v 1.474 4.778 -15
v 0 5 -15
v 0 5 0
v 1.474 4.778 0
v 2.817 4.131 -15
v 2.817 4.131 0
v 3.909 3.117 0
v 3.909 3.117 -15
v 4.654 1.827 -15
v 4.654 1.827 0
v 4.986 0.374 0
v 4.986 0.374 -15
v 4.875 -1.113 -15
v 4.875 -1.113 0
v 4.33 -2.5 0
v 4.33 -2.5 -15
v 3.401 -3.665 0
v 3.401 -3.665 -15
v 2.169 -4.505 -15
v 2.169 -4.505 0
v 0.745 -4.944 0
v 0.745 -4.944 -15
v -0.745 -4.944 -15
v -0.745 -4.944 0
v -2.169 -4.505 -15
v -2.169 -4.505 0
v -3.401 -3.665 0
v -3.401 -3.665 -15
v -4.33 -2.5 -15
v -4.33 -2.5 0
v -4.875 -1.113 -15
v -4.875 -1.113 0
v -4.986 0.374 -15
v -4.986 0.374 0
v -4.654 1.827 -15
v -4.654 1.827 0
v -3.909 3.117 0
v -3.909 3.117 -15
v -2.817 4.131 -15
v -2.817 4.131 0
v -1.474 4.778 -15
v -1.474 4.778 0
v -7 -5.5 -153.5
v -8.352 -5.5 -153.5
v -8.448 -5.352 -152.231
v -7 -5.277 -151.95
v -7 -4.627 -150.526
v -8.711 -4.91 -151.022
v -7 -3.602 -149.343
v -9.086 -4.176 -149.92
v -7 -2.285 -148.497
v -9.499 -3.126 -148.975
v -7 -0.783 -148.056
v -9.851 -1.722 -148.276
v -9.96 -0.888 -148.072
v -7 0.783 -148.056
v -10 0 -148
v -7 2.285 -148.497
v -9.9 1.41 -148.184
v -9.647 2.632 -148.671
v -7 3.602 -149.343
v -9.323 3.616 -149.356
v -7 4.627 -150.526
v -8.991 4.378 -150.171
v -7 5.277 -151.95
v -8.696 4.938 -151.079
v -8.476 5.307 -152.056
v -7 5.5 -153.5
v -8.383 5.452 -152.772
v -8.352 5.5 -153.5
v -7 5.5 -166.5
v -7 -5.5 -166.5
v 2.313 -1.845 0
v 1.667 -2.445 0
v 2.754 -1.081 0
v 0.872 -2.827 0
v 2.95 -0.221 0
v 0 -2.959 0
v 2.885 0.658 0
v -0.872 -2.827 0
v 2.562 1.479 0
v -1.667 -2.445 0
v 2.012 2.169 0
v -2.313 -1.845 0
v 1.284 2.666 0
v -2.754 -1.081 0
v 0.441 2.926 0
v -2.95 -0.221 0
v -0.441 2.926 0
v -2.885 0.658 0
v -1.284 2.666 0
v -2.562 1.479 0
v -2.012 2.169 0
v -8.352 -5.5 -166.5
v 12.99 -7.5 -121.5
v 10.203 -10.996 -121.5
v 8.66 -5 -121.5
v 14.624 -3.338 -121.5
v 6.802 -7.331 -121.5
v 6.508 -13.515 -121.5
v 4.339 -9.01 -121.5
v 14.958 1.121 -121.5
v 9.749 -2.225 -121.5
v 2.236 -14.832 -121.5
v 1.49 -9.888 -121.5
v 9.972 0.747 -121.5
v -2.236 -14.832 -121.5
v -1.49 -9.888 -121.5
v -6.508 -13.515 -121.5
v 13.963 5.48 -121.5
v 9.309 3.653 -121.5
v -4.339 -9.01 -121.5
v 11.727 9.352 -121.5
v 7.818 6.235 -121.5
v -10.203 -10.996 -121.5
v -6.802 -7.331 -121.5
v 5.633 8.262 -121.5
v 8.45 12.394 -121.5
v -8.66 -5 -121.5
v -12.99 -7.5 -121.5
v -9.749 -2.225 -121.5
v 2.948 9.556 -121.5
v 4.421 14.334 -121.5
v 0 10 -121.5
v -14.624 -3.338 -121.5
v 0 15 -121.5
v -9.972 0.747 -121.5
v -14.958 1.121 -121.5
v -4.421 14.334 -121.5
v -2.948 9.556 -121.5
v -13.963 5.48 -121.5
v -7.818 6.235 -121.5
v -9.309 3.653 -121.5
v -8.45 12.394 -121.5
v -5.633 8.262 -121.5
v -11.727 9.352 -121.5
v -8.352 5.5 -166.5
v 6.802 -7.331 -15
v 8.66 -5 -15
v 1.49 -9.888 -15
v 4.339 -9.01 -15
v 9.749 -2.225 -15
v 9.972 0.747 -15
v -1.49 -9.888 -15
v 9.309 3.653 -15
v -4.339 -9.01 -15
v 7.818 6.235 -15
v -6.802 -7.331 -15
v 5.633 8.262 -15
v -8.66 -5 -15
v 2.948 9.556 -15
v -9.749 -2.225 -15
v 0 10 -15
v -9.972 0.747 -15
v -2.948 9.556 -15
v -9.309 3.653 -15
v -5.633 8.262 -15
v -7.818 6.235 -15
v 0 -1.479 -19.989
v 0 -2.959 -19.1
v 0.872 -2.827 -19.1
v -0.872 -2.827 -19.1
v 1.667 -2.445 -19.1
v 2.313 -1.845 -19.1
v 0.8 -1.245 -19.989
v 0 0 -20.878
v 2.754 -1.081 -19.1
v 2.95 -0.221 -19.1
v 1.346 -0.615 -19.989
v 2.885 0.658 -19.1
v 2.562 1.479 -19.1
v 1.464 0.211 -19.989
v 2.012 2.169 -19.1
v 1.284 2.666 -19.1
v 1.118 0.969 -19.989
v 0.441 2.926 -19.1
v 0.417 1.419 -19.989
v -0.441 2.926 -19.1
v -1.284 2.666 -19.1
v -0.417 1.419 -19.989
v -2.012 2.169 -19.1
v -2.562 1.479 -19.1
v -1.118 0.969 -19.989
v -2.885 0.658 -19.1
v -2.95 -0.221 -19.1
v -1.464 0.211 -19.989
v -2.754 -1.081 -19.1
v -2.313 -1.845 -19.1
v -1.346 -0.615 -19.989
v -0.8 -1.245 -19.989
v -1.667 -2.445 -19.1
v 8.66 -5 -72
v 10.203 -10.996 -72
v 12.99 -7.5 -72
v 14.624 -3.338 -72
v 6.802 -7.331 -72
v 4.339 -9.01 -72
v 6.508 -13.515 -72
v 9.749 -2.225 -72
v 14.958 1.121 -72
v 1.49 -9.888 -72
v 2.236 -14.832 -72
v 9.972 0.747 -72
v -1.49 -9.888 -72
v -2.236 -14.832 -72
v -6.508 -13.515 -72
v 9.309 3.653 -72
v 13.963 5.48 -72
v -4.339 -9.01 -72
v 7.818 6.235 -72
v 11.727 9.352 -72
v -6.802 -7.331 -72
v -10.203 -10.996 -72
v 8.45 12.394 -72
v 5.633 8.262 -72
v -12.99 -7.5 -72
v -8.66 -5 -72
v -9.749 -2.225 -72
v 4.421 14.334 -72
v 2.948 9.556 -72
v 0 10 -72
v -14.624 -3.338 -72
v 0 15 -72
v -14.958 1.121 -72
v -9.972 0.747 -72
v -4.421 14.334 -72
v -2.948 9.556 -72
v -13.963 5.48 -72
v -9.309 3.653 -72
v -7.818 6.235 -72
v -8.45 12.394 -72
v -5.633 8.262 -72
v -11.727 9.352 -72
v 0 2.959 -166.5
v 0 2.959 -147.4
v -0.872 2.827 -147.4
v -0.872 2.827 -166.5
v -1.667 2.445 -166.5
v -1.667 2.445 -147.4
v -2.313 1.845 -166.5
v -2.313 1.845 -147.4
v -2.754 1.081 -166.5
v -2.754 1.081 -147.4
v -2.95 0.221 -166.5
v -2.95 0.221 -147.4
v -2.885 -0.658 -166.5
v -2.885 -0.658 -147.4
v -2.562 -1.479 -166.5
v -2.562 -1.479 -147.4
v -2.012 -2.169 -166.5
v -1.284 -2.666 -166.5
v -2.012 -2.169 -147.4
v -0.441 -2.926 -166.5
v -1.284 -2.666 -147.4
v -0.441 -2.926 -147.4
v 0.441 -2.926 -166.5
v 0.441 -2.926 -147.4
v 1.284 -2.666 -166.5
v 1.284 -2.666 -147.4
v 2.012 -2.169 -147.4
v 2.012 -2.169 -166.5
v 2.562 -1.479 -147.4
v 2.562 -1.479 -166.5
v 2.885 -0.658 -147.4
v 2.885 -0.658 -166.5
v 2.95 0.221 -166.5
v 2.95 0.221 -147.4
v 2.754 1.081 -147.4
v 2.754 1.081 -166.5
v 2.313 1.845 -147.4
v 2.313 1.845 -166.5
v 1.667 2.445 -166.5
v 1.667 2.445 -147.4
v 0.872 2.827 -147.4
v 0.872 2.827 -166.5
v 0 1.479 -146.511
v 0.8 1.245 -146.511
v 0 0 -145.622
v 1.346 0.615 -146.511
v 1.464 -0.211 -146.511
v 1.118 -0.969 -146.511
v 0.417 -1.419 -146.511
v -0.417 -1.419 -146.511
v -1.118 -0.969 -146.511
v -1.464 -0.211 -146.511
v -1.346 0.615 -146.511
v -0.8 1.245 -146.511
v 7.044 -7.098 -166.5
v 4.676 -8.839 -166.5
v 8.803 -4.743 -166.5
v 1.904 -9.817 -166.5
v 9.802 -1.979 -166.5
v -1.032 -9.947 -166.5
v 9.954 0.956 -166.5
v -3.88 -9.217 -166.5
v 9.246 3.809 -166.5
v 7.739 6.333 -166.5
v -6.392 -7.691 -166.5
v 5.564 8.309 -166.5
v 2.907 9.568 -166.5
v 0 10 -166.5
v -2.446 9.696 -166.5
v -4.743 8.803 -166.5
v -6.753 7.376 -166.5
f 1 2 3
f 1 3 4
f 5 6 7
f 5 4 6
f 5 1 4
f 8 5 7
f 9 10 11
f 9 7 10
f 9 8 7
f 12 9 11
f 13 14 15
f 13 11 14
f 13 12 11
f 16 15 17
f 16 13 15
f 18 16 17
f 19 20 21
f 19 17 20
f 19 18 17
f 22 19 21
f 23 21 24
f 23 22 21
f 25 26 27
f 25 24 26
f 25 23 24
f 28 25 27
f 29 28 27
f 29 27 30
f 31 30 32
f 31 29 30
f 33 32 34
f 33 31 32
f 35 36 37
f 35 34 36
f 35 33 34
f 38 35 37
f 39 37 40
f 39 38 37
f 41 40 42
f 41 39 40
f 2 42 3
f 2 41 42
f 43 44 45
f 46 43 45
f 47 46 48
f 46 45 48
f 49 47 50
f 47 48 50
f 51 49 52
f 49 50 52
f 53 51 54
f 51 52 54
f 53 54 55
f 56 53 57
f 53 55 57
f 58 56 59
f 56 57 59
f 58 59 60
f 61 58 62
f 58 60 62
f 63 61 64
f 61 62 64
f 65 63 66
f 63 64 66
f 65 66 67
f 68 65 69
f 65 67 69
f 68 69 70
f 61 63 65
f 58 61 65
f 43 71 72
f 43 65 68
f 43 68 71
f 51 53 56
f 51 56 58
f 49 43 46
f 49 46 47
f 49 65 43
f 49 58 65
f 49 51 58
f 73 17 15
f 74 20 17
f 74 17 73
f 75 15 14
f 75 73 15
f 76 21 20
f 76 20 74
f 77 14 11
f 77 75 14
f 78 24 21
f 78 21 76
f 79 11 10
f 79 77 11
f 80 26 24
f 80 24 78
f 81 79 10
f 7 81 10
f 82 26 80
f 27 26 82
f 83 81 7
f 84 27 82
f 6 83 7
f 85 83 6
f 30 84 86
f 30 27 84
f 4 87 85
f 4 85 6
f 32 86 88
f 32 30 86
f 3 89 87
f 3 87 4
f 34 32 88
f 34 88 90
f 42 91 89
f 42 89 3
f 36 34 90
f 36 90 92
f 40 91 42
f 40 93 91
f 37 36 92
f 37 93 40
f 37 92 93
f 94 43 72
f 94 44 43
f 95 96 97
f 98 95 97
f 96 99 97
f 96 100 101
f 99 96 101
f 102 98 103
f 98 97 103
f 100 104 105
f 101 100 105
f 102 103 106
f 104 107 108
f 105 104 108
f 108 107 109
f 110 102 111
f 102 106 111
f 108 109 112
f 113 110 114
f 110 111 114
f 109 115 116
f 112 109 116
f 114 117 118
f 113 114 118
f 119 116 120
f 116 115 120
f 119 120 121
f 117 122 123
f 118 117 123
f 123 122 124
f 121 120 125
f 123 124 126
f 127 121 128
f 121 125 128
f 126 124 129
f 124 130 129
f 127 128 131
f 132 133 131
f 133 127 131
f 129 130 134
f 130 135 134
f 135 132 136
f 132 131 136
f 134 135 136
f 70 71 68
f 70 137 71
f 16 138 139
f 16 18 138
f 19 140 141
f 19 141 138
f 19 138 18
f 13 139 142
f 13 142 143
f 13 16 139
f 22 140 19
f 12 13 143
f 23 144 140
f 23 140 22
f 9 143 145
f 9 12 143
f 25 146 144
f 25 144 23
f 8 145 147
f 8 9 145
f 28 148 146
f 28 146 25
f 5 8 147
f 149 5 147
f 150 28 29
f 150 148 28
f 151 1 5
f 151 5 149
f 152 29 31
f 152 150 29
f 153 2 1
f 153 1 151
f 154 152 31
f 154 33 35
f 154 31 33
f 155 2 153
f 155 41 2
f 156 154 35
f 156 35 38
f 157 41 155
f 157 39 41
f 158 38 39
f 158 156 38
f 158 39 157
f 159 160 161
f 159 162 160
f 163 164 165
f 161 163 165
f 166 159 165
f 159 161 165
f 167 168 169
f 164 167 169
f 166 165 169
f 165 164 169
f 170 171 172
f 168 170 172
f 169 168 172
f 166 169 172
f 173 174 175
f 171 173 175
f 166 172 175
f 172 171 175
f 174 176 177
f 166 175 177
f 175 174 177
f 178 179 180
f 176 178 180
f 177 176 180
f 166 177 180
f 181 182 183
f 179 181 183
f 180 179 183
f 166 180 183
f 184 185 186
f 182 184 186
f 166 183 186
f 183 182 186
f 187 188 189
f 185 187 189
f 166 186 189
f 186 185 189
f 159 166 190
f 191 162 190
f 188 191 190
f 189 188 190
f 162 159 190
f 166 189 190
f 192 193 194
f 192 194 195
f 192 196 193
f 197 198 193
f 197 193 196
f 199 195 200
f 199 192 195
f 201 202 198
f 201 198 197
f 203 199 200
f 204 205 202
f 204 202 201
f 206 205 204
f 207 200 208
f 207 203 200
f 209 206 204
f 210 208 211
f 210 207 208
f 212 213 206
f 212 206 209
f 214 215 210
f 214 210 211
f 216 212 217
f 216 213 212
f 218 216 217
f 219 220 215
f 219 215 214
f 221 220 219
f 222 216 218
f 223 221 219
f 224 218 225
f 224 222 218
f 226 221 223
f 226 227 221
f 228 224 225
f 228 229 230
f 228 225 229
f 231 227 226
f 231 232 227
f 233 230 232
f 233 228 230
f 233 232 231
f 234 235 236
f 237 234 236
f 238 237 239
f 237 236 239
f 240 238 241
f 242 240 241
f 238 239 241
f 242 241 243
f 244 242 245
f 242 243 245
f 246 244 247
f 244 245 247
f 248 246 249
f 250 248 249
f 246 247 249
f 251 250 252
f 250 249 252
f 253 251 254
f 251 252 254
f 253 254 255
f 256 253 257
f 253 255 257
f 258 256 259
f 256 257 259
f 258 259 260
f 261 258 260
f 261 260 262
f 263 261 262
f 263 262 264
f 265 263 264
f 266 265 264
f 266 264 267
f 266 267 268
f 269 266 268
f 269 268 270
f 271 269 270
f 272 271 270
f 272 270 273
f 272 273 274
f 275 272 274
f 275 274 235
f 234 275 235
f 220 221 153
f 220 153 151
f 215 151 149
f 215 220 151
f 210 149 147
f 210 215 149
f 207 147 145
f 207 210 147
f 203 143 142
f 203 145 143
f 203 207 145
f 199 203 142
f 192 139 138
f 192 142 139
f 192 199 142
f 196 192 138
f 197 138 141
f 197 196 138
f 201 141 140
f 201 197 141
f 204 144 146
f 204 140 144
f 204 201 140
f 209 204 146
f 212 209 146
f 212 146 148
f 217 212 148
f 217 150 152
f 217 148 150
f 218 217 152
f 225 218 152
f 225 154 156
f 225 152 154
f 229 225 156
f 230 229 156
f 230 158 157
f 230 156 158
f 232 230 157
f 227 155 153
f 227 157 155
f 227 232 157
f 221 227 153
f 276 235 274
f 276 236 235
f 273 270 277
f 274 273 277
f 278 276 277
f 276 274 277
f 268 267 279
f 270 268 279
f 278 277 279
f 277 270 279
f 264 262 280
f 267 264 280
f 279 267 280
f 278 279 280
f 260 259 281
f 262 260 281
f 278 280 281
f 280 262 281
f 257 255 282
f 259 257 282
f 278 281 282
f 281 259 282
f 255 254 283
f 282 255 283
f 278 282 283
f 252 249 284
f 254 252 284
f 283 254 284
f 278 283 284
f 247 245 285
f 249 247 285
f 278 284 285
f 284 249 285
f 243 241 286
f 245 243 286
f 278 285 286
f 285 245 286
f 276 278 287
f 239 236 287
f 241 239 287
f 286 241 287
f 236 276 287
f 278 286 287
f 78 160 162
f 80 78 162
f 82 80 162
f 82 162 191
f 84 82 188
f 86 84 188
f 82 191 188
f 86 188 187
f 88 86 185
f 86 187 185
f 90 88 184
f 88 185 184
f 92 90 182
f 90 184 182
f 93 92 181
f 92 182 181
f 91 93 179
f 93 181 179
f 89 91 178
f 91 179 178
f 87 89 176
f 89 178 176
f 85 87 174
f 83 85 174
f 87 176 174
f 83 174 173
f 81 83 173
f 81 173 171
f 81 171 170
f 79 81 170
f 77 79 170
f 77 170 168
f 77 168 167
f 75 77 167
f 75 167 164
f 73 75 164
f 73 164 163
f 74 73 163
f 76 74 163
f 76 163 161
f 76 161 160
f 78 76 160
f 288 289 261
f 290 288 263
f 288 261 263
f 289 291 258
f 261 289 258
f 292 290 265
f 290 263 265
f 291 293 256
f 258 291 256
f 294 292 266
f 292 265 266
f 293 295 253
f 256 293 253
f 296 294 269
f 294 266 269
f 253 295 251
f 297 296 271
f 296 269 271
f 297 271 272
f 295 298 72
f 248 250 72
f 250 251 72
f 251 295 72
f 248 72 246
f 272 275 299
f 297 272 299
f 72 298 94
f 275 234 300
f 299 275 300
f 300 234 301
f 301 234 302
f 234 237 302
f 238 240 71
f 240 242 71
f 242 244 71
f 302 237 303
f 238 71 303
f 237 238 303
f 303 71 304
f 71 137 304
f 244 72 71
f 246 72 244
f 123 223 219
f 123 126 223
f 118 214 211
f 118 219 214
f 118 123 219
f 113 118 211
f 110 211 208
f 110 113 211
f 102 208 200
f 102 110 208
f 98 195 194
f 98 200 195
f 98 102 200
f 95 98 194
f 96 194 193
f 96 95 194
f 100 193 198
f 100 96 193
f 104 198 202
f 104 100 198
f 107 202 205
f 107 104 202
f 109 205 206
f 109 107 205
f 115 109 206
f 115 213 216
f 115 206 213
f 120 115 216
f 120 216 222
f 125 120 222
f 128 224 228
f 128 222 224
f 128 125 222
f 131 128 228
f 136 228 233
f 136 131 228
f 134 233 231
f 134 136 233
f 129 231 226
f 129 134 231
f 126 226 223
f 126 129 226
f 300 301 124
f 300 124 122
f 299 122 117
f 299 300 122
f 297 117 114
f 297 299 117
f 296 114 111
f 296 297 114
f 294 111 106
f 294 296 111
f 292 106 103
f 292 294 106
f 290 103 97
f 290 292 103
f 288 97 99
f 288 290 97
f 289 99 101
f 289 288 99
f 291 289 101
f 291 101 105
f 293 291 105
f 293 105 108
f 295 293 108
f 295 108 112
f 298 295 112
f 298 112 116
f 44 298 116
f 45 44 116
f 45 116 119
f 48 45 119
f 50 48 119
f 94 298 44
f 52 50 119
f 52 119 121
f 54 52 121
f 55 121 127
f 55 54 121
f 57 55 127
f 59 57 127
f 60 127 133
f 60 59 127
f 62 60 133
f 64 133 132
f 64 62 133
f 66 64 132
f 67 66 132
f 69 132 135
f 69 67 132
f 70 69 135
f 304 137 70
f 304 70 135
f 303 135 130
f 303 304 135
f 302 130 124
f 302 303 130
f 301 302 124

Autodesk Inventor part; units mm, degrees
ref_plane "YZ Plane" through (0, 0, 0) normal (1, 0, 0) x (0, 1, 0)
ref_plane "XZ Plane" through (0, 0, 0) normal (0, 1, 0) x (-1, 0, 0)
sketch "Sketch1" plane through (0, 0, 0) normal (1, 0, 0) x (0, 1, 0)
  line L0 (0, 0) -> (5, 0)
  line L1 (5, 0) -> (5, -15)
  line L2 (5, -15) -> (10, -15)
  line L3 (10, -15) -> (10, -72)
  line L4 (10, -72) -> (15, -72)
  line L5 (15, -72) -> (15, -121.5)
  line L6 (15, -121.5) -> (10, -121.5)
  line L7 (10, -121.5) -> (10, -166.5)
  line L8 (10, -166.5) -> (0, -166.5)
  line L9 (0, -166.5) -> (0, -166.5)
  line L10 (0, -166.5) -> (0, -166.5)
  line L11 (0, -166.5) -> (0, 0)
  point P0 (0, -83.25)
  point P1 (15, -96.75)
  point P2 (5, -166.5)
  point P3 (2.5, 0)
  point P4 (12.5, -72)
  dimension "d0" = 15
  dimension "d1" = 5
  dimension "d3" = 10
  dimension "d4" = 49.5
  dimension "d5" = 15
  dimension "d6" = 45
  dimension "d7" = 0
  dimension "d8" = 0
  dimension "d9" = 72
revolve "Revolution1" add sketch "Sketch1" angle 360 about axis through (0, 0, -166.5) along (0, 0, 1)
sketch "Sketch2" plane through (0, 0, 0) normal (0, 0, 1) x (1, 0, 0)
  circle A0 centre (0, 0) radius 5 projected
hole "Hole1" at (0, 0, 0) direction (0, 0, -1) diameter 5.9175 depth 19.1 tip angle 118 thread size "M7x1" class "6H" standard "ANSI Metric M Profile"
sketch "Sketch3" plane through (0, 0, -166.5) normal (0, 0, -1) x (-1, 0, 0)
  circle A0 centre (0, 0) radius 10 projected
  line L0 (0, 0) -> (10, 0)
  circle A1 centre (0, 0) radius 10 projected
ref_plane "Work Plane1" through (-10, 0, -166.5) normal (-1, 0, 0) x (0, -1, 0)
sketch "Sketch4" plane through (-10, 0, -166.5) normal (-1, 0, 0) x (0, -1, 0)
  line L0 (10, 45) -> (-10, 45) projected
  line L1 (10, 0) -> (-10, 0) projected
  line L2 (10, 0) -> (-10, 0) projected
  line L3 (0, 0) -> (-5.5, 0)
  line L4 (-5.5, 0) -> (-5.5, 13)
  line L5 (-5.5, 13) -> (5.5, 13) construction
  line L6 (5.5, 13) -> (5.5, 0)
  line L7 (0, 0) -> (5.5, 0)
  arc A0 (5.5, 13) -> (-5.5, 13) centre (0, 13) ccw
  point P0 (0, 166.5)
  point P1 (-5.5, 0)
  dimension "d18" = 5.5
  dimension "d19" = 13
  dimension "d20" = 11
extrude "Extrusion1" cut sketch "Sketch4" against normal blind 3
sketch "Sketch5" plane through (-7, -5.5, -166.5) normal (0, 0, -1) x (-1, 0, 0)
  point P0 (-7, 5.5)
  point P1 (-7, 5.5)
hole "Hole2" at (0, 0, -166.5) direction (0, 0, 1) diameter 5.9175 depth 19.1 tip angle 118 thread size "M7x1" class "6H" standard "ANSI Metric M Profile"
properties part number "SP002" material "Steel, Mild"
